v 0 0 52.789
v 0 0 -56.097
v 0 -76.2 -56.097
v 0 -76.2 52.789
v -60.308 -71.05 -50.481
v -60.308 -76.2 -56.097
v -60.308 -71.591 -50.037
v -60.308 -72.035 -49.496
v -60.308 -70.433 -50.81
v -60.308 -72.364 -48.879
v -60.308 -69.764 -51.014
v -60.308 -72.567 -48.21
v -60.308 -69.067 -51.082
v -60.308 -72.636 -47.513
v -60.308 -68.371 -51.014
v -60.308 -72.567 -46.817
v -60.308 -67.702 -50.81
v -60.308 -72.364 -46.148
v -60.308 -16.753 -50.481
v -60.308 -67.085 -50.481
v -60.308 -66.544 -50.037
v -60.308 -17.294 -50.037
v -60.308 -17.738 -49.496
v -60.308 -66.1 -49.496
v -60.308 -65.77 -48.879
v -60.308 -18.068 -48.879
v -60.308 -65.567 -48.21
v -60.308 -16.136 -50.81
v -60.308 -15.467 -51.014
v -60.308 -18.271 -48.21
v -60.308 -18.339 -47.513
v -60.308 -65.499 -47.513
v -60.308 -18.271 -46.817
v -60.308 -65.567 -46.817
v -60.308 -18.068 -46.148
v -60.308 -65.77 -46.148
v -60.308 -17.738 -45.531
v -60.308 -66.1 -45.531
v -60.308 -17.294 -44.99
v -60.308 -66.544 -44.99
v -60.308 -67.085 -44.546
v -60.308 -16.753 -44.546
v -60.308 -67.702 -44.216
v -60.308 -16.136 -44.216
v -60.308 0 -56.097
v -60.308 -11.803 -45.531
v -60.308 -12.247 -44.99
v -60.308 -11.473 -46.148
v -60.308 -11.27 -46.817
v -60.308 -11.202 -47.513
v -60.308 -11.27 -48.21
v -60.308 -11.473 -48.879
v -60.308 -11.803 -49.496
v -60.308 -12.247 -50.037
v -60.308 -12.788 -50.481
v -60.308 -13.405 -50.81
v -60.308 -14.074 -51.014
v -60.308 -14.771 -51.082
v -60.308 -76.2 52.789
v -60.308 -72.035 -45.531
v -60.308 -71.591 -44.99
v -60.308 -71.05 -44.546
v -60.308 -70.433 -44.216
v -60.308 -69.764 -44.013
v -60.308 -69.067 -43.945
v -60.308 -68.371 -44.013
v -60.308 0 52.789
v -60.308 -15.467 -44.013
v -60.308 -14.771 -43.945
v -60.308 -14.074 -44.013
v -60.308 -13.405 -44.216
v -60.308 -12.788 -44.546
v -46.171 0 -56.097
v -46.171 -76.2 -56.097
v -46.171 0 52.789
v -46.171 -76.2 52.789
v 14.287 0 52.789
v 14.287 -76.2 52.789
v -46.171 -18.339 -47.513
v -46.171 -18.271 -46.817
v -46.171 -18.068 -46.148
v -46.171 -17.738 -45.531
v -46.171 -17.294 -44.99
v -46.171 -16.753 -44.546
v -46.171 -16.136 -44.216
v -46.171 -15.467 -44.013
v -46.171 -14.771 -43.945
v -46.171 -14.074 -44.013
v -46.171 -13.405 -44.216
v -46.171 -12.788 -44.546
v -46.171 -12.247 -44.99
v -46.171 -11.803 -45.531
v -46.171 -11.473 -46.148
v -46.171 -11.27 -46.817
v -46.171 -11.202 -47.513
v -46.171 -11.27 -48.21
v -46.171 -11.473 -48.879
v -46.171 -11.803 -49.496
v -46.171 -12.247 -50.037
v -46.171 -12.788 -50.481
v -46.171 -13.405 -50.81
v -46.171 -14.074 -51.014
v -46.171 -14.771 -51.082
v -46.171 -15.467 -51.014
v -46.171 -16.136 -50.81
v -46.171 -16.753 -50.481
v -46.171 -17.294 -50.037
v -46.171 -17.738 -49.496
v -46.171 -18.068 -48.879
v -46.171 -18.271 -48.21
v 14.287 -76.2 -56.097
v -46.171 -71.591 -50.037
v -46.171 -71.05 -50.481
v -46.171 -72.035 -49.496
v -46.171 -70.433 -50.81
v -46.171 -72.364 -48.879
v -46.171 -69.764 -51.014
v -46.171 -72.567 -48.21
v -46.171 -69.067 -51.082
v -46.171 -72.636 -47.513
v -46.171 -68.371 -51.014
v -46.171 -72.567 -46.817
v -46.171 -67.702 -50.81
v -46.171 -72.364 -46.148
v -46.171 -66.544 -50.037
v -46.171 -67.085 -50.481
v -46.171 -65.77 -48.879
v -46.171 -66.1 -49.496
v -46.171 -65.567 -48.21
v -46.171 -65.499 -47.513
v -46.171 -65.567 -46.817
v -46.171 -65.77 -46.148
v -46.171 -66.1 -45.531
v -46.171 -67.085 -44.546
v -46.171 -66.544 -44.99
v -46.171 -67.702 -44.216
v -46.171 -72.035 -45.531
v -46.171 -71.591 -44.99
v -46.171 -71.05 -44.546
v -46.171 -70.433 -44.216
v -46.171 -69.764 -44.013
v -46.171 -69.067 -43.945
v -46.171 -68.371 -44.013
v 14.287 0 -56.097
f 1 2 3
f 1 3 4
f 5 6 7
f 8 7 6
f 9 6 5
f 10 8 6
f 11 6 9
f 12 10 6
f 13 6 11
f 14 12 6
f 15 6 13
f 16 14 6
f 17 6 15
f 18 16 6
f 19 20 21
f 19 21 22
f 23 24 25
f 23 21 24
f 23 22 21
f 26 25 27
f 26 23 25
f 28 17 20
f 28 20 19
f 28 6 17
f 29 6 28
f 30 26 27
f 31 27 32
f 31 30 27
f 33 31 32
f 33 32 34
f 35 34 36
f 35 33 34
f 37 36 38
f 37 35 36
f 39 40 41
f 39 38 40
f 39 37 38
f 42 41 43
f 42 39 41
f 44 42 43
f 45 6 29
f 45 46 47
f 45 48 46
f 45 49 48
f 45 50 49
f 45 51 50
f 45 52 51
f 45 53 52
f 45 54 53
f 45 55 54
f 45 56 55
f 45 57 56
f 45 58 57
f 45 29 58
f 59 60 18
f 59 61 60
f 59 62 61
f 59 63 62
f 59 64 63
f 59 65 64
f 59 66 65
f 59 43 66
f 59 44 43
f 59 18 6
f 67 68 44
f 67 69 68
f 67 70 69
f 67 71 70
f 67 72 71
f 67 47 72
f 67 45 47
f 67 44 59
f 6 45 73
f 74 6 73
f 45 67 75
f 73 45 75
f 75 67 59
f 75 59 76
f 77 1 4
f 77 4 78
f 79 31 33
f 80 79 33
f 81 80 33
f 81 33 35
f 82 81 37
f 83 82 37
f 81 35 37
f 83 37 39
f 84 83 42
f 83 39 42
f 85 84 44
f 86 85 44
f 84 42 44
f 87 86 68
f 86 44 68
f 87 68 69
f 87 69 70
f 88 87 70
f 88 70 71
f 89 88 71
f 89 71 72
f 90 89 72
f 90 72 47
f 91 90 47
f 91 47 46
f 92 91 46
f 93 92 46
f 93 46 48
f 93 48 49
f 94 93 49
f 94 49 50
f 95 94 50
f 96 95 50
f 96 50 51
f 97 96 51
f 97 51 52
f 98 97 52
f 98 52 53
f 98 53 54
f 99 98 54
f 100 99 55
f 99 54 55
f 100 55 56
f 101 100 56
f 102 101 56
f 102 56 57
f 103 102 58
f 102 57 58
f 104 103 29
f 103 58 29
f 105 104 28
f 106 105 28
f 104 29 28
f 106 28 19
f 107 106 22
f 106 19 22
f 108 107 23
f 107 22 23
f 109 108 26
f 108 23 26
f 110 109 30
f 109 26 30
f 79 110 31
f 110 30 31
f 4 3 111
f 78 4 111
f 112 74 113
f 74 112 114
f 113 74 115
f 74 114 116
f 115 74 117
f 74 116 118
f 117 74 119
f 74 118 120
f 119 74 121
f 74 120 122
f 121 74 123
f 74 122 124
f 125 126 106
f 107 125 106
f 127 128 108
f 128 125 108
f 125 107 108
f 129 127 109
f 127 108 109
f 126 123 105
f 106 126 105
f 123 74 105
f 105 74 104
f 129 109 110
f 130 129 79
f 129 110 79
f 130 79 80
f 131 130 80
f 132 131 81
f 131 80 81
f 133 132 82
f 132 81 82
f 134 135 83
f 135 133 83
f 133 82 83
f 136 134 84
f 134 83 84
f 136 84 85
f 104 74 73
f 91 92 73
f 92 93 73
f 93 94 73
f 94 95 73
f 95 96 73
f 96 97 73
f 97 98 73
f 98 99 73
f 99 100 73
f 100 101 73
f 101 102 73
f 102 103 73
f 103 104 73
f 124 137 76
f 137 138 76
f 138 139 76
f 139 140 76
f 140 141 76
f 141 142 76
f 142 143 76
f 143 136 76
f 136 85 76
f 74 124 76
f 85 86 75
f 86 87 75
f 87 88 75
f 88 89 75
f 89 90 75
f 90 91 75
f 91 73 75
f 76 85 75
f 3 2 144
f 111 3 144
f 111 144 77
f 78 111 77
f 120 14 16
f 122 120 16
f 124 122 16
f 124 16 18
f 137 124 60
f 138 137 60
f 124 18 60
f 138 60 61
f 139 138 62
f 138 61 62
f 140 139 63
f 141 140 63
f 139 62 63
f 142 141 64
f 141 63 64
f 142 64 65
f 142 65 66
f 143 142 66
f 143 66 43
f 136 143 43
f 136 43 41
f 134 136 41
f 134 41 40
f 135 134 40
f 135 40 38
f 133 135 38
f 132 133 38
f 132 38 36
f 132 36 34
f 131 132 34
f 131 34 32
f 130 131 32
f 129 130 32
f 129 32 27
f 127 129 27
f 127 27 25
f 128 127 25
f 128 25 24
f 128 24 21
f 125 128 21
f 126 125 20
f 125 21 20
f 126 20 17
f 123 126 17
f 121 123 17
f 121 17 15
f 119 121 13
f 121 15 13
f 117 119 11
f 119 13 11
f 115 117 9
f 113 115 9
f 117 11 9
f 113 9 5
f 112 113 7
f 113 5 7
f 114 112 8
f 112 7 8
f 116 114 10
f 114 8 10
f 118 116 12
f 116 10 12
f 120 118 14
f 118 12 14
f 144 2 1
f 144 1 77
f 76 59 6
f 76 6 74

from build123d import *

# Parameters (mm, degrees)
F0_W     = 14.1371041536
F0_H     = 108.8857911527
F1_DEPTH = 76.2
F0_W_2   = 14.2874987796
F3_D     = 7.1374


with BuildPart() as f1:
    # F0 (on Front) → F1 (new body)
    with BuildSketch(Plane.XZ):
        with Locations((-53.239736706, -1.6543436795)):
            Rectangle(F0_W, F0_H)
    extrude(amount=F1_DEPTH)

    # F3 (through all)
    with Locations(Plane.YZ.offset(-46.1711846292)):
        with Locations((-69.0673366189, -47.5133731961), (-14.770526439, -47.5133731961)):
            Hole(F3_D / 2)


with BuildPart() as f1b:
    # F0 (on Front) → F1, piece 2 (new body)
    with BuildSketch(Plane.XZ):
        with Locations((7.1437493898, -1.6543436795)):
            Rectangle(F0_W_2, F0_H)
    extrude(amount=F1_DEPTH)


solid = Compound([f1.part, f1b.part])
